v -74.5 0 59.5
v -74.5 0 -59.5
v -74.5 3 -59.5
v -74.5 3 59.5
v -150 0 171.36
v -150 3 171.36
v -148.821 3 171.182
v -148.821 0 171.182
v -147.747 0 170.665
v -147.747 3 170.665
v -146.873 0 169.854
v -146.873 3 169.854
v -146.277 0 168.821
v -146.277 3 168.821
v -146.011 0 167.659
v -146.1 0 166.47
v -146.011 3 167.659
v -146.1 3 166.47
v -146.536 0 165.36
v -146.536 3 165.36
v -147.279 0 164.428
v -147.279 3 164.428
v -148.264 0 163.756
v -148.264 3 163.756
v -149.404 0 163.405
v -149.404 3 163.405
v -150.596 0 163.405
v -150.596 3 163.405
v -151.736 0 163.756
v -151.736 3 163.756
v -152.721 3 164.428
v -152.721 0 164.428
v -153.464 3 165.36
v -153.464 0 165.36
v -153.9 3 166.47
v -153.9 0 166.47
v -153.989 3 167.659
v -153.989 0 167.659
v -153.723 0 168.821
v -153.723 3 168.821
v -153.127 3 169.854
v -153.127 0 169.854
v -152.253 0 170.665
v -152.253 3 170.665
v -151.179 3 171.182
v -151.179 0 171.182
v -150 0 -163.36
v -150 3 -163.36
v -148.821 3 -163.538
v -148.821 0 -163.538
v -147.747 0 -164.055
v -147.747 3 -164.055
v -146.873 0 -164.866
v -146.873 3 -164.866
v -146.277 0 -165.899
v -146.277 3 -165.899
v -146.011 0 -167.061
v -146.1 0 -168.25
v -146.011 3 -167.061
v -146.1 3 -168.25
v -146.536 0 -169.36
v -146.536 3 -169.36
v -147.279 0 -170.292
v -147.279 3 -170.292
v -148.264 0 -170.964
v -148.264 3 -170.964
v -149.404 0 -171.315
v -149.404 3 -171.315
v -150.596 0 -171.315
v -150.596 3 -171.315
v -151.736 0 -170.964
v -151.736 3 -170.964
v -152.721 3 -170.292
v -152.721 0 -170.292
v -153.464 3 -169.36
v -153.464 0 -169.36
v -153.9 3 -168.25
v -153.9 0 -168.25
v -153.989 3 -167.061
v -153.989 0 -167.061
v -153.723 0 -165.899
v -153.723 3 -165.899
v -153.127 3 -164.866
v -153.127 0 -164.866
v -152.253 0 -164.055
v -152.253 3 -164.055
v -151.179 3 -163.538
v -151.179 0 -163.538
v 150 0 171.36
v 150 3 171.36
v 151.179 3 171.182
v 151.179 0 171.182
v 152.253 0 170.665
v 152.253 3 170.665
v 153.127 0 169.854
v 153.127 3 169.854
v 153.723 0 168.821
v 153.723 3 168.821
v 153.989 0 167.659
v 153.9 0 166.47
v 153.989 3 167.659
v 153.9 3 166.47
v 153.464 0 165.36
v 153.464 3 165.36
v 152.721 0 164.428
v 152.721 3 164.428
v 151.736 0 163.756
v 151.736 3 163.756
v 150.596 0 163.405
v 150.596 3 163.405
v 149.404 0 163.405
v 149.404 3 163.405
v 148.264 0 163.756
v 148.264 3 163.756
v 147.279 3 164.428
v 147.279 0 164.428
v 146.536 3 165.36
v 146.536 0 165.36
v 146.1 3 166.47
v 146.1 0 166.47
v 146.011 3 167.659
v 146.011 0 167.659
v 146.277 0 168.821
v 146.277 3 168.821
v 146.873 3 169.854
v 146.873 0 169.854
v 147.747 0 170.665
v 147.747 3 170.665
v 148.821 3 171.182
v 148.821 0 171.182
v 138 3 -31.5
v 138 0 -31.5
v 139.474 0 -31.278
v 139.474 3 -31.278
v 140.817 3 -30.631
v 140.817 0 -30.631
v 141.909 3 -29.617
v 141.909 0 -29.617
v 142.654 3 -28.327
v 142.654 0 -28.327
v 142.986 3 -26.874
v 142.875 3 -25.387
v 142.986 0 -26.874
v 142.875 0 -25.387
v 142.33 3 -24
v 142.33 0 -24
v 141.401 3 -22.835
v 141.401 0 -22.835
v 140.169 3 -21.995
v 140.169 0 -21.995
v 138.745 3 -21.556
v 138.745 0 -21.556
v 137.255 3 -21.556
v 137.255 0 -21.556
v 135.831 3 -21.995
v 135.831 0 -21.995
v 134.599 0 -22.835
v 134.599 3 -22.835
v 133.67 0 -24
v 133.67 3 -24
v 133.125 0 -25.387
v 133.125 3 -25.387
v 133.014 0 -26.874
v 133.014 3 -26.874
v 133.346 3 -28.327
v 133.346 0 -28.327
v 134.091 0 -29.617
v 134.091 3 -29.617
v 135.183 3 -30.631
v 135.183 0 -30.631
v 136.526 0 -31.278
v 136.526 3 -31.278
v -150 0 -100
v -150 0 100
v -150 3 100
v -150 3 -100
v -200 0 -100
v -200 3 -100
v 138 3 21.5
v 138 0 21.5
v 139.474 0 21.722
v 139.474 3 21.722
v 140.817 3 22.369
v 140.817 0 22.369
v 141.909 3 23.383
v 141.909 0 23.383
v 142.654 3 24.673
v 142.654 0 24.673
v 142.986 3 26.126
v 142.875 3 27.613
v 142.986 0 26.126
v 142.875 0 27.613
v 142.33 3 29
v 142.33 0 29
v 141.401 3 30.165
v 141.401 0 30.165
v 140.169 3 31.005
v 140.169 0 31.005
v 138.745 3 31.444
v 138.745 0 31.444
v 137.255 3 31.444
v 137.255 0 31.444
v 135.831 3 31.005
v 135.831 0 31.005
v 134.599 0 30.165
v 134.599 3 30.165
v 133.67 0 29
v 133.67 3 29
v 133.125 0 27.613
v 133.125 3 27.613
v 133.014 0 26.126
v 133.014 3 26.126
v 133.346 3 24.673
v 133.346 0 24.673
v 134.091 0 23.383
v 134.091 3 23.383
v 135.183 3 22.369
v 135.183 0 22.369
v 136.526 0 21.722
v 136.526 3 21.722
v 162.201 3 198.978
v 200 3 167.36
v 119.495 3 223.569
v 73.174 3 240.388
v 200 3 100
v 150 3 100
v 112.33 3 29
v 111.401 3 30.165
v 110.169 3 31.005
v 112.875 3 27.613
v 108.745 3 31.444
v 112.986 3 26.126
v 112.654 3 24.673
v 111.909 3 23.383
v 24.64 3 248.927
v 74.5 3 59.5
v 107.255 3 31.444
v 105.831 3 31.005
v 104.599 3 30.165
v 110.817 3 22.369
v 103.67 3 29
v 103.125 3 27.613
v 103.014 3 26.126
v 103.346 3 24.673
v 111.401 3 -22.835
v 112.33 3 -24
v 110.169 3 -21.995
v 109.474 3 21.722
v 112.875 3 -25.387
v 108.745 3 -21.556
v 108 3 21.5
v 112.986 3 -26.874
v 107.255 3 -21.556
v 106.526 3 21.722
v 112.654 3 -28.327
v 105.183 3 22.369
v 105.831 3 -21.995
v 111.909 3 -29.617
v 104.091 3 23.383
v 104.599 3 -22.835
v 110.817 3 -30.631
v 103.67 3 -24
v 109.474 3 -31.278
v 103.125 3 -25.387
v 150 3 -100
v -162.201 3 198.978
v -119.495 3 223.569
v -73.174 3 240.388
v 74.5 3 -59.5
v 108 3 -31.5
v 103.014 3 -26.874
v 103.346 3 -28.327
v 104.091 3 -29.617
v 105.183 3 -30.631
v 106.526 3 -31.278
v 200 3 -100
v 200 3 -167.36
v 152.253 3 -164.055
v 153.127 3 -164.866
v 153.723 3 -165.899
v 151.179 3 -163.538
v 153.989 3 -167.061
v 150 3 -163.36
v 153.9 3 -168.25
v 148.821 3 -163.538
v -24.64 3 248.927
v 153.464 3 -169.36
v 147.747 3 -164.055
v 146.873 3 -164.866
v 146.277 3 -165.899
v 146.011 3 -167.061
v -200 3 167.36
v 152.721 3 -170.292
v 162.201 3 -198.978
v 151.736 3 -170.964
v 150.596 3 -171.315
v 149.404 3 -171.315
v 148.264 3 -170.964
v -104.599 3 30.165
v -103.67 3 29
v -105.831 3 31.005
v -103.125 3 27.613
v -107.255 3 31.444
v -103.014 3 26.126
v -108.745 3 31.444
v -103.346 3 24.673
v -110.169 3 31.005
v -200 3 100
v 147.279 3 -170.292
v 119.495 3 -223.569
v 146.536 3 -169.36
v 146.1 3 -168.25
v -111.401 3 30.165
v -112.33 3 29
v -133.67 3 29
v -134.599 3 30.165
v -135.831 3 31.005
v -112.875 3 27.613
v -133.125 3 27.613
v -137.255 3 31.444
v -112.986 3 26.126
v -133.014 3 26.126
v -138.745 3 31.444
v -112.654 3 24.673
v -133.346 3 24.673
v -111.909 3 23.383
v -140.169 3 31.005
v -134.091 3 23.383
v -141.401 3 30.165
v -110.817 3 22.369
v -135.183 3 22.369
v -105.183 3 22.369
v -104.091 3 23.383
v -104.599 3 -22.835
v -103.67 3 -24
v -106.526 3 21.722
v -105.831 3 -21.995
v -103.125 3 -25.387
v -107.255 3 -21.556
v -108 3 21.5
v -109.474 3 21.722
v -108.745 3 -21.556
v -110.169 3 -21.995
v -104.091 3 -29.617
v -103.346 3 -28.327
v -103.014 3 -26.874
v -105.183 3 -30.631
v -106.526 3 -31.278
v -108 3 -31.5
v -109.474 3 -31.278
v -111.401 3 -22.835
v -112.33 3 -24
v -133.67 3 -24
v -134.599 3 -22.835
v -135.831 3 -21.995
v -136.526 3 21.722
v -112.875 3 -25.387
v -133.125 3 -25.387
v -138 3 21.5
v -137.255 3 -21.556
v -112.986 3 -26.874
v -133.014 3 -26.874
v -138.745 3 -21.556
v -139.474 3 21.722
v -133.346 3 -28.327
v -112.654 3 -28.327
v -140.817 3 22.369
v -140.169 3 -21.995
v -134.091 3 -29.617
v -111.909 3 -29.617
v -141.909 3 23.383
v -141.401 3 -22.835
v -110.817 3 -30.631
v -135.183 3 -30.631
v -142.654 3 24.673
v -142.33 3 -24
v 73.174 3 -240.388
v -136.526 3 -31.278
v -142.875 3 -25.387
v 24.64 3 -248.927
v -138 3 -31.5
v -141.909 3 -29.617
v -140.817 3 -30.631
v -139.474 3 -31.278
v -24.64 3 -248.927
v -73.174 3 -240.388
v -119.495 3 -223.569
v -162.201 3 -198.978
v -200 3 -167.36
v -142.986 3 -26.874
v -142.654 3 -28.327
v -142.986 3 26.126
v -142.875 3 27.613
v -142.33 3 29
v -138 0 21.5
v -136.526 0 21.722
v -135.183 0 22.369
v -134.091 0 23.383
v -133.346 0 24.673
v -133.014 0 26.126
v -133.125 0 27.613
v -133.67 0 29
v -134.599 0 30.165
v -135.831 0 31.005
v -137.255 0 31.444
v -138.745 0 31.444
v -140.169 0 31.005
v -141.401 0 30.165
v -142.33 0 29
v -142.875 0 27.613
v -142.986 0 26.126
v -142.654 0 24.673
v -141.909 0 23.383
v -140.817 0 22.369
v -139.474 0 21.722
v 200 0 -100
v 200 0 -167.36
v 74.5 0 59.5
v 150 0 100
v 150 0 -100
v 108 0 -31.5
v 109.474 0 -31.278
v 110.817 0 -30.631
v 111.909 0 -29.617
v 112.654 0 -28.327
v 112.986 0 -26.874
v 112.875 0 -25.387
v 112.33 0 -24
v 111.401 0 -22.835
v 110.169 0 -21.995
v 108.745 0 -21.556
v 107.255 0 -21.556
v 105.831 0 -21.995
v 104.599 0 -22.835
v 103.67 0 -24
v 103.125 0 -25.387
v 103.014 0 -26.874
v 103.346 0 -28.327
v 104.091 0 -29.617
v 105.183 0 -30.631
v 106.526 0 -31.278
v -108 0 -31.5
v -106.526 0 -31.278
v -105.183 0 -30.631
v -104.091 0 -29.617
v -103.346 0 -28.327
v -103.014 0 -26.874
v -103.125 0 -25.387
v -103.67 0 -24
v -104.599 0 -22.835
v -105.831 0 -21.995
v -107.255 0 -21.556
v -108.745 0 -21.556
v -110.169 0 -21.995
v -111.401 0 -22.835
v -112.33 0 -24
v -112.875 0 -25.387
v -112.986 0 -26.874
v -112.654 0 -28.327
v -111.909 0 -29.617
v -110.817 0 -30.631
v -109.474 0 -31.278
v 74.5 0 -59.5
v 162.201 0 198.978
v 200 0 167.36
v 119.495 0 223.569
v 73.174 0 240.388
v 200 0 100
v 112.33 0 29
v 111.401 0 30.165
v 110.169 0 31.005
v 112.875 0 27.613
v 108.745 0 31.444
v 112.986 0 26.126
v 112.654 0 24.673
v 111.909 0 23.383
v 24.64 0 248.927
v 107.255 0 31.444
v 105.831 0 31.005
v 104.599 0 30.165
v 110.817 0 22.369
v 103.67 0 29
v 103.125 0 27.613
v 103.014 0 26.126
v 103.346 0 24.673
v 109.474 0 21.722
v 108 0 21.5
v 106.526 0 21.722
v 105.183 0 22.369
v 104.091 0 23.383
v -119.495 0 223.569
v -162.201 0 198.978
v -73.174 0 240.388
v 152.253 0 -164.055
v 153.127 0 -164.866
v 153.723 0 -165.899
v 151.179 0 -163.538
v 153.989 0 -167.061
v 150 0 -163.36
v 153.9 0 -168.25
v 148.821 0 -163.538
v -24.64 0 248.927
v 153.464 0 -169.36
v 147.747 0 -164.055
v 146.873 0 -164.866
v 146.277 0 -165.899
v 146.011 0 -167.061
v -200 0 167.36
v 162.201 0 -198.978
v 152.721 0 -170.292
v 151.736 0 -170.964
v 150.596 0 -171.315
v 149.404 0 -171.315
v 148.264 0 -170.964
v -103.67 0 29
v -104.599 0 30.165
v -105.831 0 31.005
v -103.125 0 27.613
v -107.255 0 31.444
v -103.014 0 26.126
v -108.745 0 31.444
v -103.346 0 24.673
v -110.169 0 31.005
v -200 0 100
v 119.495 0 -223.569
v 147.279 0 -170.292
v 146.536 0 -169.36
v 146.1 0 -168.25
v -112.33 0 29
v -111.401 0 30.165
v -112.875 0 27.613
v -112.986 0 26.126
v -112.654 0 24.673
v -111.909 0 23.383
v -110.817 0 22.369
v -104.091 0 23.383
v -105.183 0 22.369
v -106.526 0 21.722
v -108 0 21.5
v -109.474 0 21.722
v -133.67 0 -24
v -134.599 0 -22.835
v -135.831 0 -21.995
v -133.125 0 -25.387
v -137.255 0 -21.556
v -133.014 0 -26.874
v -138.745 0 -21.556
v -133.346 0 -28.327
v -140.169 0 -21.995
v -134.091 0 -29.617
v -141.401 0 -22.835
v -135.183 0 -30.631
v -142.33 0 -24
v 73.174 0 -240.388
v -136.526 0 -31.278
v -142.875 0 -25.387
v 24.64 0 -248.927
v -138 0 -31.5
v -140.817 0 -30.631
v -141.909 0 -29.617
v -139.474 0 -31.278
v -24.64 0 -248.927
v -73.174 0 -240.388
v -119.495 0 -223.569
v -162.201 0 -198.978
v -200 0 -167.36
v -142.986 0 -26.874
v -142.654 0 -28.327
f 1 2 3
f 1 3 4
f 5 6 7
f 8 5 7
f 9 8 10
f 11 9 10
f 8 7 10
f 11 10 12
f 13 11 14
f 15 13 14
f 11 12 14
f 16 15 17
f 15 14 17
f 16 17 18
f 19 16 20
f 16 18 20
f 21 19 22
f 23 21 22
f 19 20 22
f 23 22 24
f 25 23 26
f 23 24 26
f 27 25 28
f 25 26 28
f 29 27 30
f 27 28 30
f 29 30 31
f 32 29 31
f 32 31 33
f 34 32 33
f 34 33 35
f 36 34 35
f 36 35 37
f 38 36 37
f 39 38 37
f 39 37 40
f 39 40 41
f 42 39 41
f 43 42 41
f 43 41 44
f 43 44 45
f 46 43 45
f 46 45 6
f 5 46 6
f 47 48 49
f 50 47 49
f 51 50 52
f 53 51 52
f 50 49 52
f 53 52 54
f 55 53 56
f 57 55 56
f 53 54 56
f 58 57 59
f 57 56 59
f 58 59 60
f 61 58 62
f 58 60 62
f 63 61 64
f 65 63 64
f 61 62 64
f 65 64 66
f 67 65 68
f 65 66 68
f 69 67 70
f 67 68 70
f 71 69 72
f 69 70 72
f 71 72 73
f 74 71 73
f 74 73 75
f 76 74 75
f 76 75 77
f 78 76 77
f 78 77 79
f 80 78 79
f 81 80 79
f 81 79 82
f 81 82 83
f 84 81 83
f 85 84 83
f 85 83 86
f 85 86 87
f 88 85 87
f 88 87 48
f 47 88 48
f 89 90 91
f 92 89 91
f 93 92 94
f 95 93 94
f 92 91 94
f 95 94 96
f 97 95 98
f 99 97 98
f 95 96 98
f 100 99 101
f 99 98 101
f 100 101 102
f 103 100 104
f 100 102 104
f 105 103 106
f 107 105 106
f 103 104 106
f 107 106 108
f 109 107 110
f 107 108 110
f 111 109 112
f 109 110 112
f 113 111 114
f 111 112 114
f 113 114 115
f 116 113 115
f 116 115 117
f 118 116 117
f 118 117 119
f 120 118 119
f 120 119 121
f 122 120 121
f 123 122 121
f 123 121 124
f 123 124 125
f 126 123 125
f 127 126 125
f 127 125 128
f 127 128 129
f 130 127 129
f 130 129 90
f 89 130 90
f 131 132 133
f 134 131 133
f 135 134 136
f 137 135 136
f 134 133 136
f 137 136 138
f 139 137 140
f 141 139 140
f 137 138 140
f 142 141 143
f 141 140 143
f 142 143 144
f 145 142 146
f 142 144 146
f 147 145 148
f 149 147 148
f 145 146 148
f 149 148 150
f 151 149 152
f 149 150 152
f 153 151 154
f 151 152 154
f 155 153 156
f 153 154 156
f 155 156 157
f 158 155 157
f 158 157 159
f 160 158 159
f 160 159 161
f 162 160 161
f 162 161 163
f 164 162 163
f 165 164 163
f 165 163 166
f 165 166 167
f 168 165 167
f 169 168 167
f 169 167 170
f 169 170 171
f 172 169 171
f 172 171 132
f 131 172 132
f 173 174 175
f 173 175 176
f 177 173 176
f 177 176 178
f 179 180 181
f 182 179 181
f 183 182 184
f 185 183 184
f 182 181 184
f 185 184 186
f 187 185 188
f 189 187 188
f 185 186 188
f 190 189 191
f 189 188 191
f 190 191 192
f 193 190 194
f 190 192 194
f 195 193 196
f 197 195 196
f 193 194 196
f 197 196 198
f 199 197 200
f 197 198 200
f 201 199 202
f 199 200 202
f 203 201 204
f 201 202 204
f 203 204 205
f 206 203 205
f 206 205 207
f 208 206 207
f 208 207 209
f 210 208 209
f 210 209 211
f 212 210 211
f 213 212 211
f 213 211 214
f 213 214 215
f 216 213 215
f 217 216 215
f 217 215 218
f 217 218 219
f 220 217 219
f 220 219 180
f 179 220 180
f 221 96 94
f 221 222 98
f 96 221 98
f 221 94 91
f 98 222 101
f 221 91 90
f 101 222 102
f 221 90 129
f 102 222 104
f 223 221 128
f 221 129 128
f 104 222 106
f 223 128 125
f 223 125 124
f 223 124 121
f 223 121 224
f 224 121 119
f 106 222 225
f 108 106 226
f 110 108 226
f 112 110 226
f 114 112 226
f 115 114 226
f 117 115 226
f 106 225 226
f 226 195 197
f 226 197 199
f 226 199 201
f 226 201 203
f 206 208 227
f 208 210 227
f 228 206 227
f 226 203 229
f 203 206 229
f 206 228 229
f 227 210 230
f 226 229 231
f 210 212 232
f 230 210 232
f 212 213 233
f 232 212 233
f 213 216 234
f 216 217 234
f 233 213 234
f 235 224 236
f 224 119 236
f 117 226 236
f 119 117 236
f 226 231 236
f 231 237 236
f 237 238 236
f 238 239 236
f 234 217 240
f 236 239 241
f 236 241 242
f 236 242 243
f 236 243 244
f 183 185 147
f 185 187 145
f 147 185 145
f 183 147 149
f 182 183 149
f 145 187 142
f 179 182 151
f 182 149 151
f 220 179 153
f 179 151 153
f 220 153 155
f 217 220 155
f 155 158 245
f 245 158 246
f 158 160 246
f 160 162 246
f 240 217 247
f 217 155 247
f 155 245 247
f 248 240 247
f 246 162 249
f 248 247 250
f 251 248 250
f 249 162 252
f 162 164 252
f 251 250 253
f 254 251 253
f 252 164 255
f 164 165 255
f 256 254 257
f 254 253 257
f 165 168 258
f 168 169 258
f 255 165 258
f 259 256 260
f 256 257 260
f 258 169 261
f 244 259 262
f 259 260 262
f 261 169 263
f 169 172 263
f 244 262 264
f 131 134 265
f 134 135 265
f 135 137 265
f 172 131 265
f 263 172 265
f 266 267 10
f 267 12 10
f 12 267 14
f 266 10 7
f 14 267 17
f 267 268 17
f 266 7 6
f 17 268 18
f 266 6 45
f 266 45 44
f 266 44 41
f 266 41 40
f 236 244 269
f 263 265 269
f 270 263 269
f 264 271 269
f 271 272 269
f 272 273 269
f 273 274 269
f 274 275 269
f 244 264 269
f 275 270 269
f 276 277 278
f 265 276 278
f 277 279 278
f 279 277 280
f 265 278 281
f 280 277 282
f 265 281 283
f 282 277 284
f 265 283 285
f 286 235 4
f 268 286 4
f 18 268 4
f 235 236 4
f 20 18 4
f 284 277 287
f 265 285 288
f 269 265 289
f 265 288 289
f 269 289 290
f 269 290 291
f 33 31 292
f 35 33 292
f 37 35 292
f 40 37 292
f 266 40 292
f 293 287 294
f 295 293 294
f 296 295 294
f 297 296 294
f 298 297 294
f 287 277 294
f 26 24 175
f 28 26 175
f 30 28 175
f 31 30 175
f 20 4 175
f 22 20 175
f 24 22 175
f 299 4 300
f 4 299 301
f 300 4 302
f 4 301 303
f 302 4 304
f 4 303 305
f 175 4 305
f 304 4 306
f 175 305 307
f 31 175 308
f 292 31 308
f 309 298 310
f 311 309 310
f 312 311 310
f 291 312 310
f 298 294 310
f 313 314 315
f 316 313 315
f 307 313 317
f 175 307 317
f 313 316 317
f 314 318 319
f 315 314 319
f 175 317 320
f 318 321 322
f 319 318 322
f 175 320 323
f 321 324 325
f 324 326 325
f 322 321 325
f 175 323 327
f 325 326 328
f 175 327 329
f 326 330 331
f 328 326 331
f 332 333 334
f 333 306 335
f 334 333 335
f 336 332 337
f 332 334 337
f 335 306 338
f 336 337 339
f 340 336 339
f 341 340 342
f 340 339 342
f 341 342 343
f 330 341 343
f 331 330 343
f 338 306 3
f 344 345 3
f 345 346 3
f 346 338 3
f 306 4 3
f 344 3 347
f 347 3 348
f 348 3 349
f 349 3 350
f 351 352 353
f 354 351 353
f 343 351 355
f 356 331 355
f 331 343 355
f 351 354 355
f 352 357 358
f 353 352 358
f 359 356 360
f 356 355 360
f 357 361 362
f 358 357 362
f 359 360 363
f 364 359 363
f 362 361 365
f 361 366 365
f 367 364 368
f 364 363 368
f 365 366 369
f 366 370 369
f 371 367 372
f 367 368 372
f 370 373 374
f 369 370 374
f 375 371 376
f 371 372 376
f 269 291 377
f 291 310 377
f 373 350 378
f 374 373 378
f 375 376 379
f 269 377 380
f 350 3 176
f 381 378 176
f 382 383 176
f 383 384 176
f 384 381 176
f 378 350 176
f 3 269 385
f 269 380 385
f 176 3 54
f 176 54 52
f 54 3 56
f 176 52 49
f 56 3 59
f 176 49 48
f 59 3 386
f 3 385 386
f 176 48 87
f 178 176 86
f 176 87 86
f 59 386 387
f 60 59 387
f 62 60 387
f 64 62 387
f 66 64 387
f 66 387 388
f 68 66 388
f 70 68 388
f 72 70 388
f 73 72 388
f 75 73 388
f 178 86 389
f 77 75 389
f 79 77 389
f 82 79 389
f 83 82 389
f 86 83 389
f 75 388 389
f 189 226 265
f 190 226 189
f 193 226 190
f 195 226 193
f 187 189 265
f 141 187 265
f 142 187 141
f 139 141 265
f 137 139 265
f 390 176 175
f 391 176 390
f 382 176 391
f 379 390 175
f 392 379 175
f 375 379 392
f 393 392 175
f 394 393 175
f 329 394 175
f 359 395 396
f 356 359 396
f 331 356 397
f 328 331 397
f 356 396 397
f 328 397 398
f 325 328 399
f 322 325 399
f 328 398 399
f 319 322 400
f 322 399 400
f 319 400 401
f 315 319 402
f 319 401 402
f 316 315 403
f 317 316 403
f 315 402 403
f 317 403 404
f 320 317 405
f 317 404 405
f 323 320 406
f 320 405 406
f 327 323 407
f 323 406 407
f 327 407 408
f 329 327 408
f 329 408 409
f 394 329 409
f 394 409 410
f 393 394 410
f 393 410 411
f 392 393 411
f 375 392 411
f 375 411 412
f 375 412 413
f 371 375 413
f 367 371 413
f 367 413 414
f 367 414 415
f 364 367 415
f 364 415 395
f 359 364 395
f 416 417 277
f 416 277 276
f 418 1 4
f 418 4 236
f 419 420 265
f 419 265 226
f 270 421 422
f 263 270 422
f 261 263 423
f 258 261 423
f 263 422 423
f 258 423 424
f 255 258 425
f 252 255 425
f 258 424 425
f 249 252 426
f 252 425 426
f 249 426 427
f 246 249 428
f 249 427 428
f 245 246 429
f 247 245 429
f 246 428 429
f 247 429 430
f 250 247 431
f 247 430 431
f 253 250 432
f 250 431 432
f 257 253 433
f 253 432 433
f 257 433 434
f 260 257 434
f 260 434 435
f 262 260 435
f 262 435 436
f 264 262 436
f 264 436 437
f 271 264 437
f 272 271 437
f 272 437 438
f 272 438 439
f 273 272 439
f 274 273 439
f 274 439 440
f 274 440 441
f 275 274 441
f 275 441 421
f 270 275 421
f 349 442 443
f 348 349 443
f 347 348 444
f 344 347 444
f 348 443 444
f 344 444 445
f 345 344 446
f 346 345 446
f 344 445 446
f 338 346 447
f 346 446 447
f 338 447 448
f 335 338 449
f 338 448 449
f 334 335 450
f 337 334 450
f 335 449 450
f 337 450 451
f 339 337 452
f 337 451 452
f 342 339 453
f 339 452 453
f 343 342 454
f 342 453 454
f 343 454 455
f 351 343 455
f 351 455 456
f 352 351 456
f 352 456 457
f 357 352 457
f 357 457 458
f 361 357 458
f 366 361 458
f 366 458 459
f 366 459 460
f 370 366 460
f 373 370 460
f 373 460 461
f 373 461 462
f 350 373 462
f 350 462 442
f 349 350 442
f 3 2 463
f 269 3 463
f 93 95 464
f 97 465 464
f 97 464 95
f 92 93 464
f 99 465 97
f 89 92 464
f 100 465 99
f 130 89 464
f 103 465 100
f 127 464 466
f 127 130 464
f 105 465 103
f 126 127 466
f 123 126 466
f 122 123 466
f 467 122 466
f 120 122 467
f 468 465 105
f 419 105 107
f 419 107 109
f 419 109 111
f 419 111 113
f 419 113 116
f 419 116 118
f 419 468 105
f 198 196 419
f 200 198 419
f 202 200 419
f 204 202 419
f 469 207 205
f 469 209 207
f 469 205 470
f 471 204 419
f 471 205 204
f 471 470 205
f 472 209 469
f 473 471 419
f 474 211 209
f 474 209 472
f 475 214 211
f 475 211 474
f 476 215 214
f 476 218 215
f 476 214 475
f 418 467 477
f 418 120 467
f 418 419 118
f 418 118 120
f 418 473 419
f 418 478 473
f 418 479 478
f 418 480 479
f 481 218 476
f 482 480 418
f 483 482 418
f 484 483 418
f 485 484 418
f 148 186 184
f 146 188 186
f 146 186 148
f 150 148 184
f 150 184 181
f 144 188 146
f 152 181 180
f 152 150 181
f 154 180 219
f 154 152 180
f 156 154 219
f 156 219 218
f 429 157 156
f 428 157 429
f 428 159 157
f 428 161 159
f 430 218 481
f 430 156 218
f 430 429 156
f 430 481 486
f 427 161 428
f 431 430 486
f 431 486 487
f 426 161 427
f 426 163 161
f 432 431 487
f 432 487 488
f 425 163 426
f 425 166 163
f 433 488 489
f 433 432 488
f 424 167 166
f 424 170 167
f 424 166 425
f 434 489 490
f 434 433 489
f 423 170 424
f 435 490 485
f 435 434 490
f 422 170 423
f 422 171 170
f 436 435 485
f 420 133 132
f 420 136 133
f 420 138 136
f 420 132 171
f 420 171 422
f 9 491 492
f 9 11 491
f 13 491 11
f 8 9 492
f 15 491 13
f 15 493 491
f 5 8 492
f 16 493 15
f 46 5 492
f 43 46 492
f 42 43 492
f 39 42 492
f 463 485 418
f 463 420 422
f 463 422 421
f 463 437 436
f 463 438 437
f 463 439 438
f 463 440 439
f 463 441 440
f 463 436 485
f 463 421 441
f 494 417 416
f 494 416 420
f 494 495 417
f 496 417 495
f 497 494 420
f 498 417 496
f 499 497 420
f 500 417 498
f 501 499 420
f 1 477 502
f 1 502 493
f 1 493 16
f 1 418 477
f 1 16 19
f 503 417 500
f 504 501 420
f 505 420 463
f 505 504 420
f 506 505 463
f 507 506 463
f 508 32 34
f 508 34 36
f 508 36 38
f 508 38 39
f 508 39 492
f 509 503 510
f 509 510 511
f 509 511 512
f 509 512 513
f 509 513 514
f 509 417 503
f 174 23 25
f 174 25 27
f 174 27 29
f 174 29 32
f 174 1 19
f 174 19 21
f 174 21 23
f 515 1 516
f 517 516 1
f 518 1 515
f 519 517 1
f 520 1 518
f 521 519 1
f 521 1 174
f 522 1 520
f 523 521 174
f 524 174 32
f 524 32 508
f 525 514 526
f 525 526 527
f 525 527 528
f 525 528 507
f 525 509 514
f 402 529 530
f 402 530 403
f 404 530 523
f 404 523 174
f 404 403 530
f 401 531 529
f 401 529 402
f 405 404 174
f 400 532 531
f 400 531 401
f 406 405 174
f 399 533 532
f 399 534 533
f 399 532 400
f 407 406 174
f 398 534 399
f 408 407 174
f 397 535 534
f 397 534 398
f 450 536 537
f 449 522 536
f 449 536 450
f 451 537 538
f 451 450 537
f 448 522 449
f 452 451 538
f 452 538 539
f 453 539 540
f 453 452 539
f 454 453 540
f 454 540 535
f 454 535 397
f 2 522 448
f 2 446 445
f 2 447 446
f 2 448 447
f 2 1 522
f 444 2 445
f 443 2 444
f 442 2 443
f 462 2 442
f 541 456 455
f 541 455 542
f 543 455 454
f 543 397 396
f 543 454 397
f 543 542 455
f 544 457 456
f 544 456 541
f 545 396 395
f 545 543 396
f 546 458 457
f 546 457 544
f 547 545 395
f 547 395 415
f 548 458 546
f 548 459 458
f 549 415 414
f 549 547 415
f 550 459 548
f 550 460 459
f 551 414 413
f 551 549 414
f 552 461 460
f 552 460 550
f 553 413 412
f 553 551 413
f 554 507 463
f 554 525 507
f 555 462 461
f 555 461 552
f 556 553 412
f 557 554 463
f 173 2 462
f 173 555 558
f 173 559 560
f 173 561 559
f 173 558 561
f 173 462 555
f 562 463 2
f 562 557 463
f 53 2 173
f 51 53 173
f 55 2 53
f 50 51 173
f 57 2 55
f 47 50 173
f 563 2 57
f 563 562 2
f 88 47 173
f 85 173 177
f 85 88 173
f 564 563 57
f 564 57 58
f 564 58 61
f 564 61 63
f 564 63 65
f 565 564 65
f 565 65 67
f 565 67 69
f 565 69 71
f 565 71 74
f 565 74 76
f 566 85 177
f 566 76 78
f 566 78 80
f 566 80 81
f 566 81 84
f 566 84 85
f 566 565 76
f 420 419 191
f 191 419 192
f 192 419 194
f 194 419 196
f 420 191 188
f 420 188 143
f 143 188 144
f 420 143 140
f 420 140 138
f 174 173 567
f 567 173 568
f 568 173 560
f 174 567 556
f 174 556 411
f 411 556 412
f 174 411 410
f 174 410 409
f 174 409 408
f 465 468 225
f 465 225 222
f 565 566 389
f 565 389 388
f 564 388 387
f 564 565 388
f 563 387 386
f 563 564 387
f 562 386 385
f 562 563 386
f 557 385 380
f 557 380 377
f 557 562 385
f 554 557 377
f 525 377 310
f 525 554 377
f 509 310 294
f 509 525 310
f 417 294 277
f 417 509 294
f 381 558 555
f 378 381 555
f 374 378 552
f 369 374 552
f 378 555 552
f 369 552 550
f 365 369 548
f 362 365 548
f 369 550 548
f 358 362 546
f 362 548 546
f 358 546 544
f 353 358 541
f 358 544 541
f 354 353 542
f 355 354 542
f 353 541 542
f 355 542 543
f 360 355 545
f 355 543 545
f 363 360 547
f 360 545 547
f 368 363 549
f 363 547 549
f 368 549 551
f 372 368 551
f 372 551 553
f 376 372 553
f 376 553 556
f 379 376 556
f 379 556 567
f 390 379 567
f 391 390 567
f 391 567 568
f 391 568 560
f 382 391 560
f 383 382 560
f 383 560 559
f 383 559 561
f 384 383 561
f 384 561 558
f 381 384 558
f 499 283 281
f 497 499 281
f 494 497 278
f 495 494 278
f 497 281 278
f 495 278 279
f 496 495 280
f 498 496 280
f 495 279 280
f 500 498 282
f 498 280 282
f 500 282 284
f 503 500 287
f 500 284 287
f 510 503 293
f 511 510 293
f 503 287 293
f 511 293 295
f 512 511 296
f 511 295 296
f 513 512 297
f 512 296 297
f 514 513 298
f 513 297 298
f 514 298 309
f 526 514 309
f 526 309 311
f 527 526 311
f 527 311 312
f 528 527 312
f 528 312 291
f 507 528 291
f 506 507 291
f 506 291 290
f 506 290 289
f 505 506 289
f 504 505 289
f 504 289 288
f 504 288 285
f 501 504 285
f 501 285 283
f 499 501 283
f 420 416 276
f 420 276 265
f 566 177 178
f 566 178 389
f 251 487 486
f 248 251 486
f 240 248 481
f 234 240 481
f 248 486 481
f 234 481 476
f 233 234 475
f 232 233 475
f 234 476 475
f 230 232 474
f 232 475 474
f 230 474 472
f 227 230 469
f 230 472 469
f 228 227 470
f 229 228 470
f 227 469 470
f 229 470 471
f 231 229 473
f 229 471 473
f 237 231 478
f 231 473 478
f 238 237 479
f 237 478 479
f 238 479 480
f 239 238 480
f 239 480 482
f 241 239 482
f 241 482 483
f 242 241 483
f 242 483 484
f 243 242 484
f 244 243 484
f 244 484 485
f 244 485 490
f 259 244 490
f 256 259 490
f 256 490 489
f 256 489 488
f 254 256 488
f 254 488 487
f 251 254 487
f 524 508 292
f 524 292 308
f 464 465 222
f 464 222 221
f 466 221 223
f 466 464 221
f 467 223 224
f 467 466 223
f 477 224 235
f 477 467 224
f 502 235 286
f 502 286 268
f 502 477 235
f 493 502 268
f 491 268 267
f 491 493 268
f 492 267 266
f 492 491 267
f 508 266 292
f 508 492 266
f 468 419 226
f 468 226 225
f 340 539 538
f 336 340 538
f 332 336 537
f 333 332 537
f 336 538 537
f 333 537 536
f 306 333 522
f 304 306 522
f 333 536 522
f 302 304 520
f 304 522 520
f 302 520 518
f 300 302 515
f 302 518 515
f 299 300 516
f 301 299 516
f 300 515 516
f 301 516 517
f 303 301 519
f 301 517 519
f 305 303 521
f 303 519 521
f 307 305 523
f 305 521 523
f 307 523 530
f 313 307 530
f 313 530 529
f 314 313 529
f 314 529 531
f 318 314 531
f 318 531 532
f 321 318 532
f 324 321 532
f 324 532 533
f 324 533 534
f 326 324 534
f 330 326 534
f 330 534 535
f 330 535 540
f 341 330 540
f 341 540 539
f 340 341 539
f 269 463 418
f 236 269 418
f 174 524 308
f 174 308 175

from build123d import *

# Parameters (mm, degrees)
BOSS_EXTRUDE1_DEPTH = 3
SKETCH4_R           = 4
CUT_EXTRUDE1_DEPTH  = 10
SKETCH6_W           = 149
SKETCH6_H           = 119
CUT_EXTRUDE2_DEPTH  = 10
SKETCH7_R           = 5
CUT_EXTRUDE3_DEPTH  = 10


with BuildPart() as part:
    # Sketch3 → Boss-Extrude1 (new body)
    with BuildSketch(Plane(origin=(0, 0, 0), x_dir=(1, 0, 0), z_dir=(0, 1, 0))):
        with BuildLine():
            Line((-150, 100), (-200, 100))
            Line((-200, 100), (-200, 167.359909647))
            ThreePointArc((-200, 167.359909647), (0, 250), (200, 167.359909647))
            Line((200, 167.359909647), (200, 100))
            Line((200, 100), (150, 100))
            Line((150, 100), (150, -100))
            Line((150, -100), (200, -100))
            Line((200, -100), (200, -167.359909647))
            ThreePointArc((200, -167.359909647), (0, -250), (-200, -167.359909647))
            Line((-200, -167.359909647), (-200, -100))
            Line((-200, -100), (-150, -100))
            Line((-150, -100), (-150, 100))
        make_face()
    extrude(amount=BOSS_EXTRUDE1_DEPTH)

    # Sketch4 → Cut-Extrude1 (cut)
    with BuildSketch(Plane(origin=(0, 3, 0), x_dir=(1, 0, 0), z_dir=(0, 1, 0))):
        with Locations(Location((-150, 167.359909647, 0), (0, 0, 270))):
            Circle(SKETCH4_R)
        with Locations(Location((150, 167.359909647, 0), (0, 0, 270))):
            Circle(SKETCH4_R)
        with Locations(Location((150, -167.359909647, 0), (0, 0, 270))):
            Circle(SKETCH4_R)
        with Locations(Location((-150, -167.359909647, 0), (0, 0, 270))):
            Circle(SKETCH4_R)
    extrude(amount=-CUT_EXTRUDE1_DEPTH, mode=Mode.SUBTRACT)

    # Sketch6 → Cut-Extrude2 (cut)
    with BuildSketch(Plane.XZ):
        Rectangle(SKETCH6_W, SKETCH6_H)
    extrude(amount=-CUT_EXTRUDE2_DEPTH, mode=Mode.SUBTRACT)

    # Sketch7 → Cut-Extrude3 (cut)
    with BuildSketch(Plane.XZ):
        with Locations(Location((-138, 26.5, 0), (0, 0, 270))):
            Circle(SKETCH7_R)
        with Locations(Location((-108, 26.5, 0), (0, 0, 270))):
            Circle(SKETCH7_R)
        with Locations(Location((108, 26.5, 0), (0, 0, 270))):
            Circle(SKETCH7_R)
        with Locations(Location((138, 26.5, 0), (0, 0, 270))):
            Circle(SKETCH7_R)
        with Locations(Location((108, -26.5, 0), (0, 0, 270))):
            Circle(SKETCH7_R)
        with Locations(Location((138, -26.5, 0), (0, 0, 270))):
            Circle(SKETCH7_R)
        with Locations(Location((-138, -26.5, 0), (0, 0, 270))):
            Circle(SKETCH7_R)
        with Locations(Location((-108, -26.5, 0), (0, 0, 270))):
            Circle(SKETCH7_R)
    extrude(amount=-CUT_EXTRUDE3_DEPTH, mode=Mode.SUBTRACT)


solid = part.part
